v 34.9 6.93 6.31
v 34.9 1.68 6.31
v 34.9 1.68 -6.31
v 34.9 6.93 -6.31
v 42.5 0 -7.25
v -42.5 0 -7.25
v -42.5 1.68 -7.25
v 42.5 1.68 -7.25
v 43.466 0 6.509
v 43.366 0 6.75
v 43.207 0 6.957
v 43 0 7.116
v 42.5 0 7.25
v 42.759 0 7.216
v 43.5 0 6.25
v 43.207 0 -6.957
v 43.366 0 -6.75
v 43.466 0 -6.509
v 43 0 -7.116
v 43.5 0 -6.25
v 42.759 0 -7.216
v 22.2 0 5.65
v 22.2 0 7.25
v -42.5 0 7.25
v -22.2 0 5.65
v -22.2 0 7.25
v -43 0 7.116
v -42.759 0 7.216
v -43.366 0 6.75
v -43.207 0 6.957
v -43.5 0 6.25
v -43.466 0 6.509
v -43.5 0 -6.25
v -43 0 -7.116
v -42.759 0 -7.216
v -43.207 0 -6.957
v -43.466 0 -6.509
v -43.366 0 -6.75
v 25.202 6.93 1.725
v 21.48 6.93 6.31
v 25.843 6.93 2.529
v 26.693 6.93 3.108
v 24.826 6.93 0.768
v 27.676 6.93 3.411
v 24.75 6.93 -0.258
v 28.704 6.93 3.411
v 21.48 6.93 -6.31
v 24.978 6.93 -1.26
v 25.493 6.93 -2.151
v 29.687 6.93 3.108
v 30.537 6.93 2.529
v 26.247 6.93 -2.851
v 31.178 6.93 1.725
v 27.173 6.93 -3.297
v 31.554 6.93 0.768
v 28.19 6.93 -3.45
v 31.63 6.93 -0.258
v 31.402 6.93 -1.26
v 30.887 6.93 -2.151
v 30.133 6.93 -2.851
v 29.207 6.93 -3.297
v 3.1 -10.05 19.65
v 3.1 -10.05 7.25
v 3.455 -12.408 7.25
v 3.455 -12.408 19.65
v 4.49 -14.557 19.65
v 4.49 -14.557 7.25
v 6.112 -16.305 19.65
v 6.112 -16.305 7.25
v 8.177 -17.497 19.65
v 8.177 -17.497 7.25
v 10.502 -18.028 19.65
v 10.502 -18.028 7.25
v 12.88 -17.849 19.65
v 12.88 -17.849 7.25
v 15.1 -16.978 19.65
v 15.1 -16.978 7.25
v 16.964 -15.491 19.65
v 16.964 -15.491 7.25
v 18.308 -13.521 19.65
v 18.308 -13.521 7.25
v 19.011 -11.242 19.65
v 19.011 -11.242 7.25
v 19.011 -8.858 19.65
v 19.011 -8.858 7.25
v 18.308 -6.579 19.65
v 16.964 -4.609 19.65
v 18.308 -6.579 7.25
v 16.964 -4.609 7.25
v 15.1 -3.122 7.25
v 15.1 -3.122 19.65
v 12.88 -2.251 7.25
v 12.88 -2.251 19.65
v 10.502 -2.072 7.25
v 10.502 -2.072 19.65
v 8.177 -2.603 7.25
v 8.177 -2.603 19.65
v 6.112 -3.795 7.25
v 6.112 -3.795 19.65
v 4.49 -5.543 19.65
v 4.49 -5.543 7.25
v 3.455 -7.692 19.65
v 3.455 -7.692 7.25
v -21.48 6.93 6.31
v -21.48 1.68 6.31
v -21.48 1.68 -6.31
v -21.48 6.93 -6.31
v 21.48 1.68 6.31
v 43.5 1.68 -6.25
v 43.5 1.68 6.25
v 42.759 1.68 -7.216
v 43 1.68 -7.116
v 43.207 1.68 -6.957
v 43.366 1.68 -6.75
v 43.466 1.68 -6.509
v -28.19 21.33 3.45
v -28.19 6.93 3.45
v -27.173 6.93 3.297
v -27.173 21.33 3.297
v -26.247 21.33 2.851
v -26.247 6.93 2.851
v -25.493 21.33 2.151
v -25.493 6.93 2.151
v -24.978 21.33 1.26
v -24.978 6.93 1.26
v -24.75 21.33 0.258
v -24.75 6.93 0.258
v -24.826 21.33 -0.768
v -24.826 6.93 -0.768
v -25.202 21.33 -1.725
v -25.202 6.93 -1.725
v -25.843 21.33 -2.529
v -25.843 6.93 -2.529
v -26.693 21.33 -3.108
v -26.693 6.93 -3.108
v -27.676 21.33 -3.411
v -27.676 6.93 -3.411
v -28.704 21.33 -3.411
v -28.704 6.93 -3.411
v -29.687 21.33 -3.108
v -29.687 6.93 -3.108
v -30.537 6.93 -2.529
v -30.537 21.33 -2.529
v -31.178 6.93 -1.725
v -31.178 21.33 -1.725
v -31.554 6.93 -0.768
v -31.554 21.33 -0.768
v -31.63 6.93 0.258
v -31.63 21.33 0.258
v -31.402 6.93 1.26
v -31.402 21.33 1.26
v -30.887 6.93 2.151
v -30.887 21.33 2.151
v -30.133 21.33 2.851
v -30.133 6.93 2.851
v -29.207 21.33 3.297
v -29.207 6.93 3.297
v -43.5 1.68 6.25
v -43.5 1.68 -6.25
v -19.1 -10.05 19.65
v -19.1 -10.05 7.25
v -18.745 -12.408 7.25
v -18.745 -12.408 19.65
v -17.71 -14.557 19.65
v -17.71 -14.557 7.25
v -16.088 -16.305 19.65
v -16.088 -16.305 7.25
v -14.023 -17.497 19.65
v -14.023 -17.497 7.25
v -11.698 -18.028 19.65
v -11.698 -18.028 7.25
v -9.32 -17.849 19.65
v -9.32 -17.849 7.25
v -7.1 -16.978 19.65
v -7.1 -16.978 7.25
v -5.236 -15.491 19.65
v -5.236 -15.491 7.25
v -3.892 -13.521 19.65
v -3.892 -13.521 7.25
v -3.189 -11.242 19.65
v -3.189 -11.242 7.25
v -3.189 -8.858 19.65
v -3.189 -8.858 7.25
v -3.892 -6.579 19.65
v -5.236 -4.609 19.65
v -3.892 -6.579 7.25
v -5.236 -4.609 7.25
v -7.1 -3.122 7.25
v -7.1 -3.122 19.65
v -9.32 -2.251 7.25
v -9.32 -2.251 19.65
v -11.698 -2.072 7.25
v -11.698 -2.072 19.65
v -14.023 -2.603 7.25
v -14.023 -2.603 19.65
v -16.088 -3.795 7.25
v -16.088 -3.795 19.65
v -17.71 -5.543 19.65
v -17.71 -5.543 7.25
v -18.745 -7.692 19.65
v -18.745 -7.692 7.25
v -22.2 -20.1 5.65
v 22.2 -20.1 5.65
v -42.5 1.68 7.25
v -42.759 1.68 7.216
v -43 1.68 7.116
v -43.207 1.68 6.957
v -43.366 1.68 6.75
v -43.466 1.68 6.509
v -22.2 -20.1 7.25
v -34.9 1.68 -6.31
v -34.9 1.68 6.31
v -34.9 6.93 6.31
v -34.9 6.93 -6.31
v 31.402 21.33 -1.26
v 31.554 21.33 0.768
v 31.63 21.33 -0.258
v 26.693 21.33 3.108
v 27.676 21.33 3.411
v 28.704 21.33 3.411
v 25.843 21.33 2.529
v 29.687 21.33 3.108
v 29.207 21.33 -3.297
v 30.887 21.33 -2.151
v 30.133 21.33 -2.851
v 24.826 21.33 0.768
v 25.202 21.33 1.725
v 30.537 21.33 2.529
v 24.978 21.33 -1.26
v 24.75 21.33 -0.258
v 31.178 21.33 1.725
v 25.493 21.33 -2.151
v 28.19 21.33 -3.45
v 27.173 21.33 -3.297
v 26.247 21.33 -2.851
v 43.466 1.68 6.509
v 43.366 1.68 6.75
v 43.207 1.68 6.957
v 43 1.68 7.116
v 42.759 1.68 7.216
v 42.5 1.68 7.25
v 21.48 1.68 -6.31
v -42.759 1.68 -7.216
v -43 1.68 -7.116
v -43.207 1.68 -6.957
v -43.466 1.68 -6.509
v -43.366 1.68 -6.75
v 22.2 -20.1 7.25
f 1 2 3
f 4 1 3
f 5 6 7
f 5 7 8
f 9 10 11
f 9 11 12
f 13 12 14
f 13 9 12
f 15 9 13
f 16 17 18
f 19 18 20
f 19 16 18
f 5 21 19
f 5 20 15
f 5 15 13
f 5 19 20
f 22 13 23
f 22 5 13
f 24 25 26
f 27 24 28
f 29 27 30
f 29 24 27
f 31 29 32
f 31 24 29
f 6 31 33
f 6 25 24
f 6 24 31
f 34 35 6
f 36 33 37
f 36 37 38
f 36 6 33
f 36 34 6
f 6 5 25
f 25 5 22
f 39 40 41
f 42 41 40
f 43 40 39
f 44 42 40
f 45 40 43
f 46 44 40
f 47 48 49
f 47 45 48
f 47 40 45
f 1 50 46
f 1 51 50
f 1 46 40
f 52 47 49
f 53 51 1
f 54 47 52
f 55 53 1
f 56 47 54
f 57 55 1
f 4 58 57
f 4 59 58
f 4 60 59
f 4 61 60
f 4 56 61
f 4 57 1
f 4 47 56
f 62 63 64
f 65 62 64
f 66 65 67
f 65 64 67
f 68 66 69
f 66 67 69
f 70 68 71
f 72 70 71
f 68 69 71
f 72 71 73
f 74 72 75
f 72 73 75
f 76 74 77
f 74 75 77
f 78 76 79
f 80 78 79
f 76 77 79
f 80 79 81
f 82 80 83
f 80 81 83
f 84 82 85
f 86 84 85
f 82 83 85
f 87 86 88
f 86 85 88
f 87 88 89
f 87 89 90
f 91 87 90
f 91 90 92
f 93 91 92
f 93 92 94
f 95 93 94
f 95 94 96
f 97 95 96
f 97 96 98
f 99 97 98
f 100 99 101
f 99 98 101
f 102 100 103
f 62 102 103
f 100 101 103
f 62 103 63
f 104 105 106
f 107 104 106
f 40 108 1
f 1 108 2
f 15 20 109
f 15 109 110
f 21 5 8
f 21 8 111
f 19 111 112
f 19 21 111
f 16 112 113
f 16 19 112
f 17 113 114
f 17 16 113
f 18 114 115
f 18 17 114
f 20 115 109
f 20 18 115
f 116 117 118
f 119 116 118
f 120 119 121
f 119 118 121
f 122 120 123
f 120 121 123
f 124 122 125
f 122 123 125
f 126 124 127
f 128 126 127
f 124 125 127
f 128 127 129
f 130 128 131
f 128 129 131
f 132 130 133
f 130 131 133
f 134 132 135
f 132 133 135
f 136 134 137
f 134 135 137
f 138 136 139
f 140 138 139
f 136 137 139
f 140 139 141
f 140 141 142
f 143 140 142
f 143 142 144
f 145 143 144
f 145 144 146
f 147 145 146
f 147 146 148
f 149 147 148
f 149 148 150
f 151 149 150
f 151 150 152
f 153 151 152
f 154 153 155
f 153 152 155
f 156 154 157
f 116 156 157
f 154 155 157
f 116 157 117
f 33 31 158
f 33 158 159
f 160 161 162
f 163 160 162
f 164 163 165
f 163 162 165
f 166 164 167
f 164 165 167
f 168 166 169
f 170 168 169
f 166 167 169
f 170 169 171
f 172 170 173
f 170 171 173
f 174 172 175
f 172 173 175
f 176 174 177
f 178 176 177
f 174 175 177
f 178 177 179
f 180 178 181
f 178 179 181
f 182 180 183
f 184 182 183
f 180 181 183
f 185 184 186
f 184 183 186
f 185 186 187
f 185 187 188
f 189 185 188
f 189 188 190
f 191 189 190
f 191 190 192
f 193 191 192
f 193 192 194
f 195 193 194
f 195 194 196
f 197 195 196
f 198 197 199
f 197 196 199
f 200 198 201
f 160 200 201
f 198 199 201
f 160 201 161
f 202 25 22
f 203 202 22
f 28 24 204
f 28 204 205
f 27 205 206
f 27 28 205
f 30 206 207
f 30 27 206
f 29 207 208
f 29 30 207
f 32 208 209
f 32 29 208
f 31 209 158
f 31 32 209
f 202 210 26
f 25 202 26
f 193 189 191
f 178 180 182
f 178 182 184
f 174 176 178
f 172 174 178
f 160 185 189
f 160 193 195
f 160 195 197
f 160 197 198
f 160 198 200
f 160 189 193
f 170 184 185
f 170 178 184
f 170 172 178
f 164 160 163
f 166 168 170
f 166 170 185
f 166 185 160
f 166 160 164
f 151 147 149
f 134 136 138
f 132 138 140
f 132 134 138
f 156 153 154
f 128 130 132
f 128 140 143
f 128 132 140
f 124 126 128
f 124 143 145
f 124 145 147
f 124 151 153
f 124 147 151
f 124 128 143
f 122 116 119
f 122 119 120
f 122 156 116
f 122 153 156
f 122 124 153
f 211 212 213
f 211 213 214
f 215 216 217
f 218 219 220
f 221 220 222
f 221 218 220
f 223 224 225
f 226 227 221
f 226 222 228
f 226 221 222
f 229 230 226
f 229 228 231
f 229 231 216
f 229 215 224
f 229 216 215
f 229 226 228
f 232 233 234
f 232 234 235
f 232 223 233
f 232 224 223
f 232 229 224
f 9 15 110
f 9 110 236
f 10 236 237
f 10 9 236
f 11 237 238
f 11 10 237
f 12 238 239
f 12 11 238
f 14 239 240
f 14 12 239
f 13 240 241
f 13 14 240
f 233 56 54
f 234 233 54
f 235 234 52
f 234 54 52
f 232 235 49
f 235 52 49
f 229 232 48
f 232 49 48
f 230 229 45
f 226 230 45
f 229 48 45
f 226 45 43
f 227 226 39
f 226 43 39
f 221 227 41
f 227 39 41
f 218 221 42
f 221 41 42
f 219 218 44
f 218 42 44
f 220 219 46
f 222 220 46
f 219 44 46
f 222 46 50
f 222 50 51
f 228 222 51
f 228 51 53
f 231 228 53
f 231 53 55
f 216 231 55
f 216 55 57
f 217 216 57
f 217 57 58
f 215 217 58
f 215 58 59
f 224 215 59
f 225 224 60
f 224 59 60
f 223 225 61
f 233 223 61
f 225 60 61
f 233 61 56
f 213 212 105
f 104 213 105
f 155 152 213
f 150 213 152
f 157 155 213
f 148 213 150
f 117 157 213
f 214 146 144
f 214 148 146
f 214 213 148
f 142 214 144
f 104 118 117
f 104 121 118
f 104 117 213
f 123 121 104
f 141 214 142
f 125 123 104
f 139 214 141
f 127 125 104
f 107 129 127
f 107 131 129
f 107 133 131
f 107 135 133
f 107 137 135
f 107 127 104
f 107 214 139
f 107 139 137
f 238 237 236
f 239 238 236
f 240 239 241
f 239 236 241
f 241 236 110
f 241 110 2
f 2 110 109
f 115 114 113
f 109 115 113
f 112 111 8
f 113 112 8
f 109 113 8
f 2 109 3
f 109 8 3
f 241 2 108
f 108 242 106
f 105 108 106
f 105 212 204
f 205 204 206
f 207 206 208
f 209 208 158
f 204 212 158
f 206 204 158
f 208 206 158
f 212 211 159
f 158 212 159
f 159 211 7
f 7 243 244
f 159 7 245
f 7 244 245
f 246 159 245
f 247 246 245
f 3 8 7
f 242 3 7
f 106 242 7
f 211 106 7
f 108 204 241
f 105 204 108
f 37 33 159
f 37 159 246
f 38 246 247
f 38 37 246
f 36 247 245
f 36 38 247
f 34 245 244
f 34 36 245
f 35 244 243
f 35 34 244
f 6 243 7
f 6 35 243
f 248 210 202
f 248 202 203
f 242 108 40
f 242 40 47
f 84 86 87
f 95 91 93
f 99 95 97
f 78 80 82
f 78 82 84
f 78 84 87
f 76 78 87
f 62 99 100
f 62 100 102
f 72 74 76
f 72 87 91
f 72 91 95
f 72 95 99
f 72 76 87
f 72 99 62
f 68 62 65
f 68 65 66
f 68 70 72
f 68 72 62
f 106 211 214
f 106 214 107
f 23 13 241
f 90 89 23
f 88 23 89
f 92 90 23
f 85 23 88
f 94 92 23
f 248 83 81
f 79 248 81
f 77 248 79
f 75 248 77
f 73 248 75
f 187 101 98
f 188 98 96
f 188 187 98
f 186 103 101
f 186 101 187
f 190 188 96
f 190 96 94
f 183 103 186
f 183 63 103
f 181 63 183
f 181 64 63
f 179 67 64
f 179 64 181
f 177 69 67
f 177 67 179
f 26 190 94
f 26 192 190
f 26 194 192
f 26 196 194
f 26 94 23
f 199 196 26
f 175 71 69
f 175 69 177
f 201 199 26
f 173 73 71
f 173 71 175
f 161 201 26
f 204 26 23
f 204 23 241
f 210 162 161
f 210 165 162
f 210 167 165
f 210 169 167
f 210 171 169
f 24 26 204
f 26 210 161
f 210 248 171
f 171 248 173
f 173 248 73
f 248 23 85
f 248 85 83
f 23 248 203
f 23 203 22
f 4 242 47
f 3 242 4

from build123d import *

# Parameters (mm, degrees)
BOSS_EXTRUDE1_DEPTH = 1.68
SKETCH3_W           = 13.42
SKETCH3_H           = 12.62
BOSS_EXTRUDE2_DEPTH = 5.25
SKETCH4_R           = 3.45
BOSS_EXTRUDE3_DEPTH = 14.4
SKETCH5_W           = 44.4
SKETCH5_H           = 20.1
BOSS_EXTRUDE4_DEPTH = 1.6
SKETCH6_R           = 8
BOSS_EXTRUDE5_DEPTH = 12.4


with BuildPart() as part:
    # Sketch1 → Boss-Extrude1 (new body)
    with BuildSketch(Plane(origin=(0, 0, 0), x_dir=(1, 0, 0), z_dir=(0, 1, 0))):
        with BuildLine():
            Line((-42.5, 7.25), (42.5, 7.25))
            ThreePointArc((42.5, 7.25), (43.207106781, 6.957106781), (43.5, 6.25))
            Line((43.5, 6.25), (43.5, -6.25))
            ThreePointArc((43.5, -6.25), (43.207106781, -6.957106781), (42.5, -7.25))
            Line((42.5, -7.25), (-42.5, -7.25))
            ThreePointArc((-42.5, -7.25), (-43.207106781, -6.957106781), (-43.5, -6.25))
            Line((-43.5, -6.25), (-43.5, 6.25))
            ThreePointArc((-43.5, 6.25), (-43.207106781, 6.957106781), (-42.5, 7.25))
        make_face()
    extrude(amount=BOSS_EXTRUDE1_DEPTH)

    # Sketch3 → Boss-Extrude2 (add)
    with BuildSketch(Plane(origin=(0, 1.68, 0), x_dir=(1, 0, 0), z_dir=(0, 1, 0))):
        with Locations((28.19, 0)):
            Rectangle(SKETCH3_W, SKETCH3_H)
        with Locations((-28.19, 0)):
            Rectangle(SKETCH3_W, SKETCH3_H)
    extrude(amount=BOSS_EXTRUDE2_DEPTH)

    # Sketch4 → Boss-Extrude3 (add)
    with BuildSketch(Plane(origin=(0, 6.93, 0), x_dir=(1, 0, 0), z_dir=(0, 1, 0))):
        with Locations(Location((-28.19, 0, 0), (0, 0, 270))):
            Circle(SKETCH4_R)
        with Locations(Location((28.19, 0, 0), (0, 0, 90))):
            Circle(SKETCH4_R)
    extrude(amount=BOSS_EXTRUDE3_DEPTH)

    # Sketch5 → Boss-Extrude4 (add)
    with BuildSketch(Plane.XY.offset(7.25)):
        with Locations((0, -10.05)):
            Rectangle(SKETCH5_W, SKETCH5_H)
    extrude(amount=-BOSS_EXTRUDE4_DEPTH)

    # Sketch6 → Boss-Extrude5 (add)
    with BuildSketch(Plane.XY.offset(7.25)):
        with Locations(Location((11.1, -10.05, 0), (0, 0, 180))):
            Circle(SKETCH6_R)
        with Locations(Location((-11.1, -10.05, 0), (0, 0, 180))):
            Circle(SKETCH6_R)
    extrude(amount=BOSS_EXTRUDE5_DEPTH)


solid = part.part
